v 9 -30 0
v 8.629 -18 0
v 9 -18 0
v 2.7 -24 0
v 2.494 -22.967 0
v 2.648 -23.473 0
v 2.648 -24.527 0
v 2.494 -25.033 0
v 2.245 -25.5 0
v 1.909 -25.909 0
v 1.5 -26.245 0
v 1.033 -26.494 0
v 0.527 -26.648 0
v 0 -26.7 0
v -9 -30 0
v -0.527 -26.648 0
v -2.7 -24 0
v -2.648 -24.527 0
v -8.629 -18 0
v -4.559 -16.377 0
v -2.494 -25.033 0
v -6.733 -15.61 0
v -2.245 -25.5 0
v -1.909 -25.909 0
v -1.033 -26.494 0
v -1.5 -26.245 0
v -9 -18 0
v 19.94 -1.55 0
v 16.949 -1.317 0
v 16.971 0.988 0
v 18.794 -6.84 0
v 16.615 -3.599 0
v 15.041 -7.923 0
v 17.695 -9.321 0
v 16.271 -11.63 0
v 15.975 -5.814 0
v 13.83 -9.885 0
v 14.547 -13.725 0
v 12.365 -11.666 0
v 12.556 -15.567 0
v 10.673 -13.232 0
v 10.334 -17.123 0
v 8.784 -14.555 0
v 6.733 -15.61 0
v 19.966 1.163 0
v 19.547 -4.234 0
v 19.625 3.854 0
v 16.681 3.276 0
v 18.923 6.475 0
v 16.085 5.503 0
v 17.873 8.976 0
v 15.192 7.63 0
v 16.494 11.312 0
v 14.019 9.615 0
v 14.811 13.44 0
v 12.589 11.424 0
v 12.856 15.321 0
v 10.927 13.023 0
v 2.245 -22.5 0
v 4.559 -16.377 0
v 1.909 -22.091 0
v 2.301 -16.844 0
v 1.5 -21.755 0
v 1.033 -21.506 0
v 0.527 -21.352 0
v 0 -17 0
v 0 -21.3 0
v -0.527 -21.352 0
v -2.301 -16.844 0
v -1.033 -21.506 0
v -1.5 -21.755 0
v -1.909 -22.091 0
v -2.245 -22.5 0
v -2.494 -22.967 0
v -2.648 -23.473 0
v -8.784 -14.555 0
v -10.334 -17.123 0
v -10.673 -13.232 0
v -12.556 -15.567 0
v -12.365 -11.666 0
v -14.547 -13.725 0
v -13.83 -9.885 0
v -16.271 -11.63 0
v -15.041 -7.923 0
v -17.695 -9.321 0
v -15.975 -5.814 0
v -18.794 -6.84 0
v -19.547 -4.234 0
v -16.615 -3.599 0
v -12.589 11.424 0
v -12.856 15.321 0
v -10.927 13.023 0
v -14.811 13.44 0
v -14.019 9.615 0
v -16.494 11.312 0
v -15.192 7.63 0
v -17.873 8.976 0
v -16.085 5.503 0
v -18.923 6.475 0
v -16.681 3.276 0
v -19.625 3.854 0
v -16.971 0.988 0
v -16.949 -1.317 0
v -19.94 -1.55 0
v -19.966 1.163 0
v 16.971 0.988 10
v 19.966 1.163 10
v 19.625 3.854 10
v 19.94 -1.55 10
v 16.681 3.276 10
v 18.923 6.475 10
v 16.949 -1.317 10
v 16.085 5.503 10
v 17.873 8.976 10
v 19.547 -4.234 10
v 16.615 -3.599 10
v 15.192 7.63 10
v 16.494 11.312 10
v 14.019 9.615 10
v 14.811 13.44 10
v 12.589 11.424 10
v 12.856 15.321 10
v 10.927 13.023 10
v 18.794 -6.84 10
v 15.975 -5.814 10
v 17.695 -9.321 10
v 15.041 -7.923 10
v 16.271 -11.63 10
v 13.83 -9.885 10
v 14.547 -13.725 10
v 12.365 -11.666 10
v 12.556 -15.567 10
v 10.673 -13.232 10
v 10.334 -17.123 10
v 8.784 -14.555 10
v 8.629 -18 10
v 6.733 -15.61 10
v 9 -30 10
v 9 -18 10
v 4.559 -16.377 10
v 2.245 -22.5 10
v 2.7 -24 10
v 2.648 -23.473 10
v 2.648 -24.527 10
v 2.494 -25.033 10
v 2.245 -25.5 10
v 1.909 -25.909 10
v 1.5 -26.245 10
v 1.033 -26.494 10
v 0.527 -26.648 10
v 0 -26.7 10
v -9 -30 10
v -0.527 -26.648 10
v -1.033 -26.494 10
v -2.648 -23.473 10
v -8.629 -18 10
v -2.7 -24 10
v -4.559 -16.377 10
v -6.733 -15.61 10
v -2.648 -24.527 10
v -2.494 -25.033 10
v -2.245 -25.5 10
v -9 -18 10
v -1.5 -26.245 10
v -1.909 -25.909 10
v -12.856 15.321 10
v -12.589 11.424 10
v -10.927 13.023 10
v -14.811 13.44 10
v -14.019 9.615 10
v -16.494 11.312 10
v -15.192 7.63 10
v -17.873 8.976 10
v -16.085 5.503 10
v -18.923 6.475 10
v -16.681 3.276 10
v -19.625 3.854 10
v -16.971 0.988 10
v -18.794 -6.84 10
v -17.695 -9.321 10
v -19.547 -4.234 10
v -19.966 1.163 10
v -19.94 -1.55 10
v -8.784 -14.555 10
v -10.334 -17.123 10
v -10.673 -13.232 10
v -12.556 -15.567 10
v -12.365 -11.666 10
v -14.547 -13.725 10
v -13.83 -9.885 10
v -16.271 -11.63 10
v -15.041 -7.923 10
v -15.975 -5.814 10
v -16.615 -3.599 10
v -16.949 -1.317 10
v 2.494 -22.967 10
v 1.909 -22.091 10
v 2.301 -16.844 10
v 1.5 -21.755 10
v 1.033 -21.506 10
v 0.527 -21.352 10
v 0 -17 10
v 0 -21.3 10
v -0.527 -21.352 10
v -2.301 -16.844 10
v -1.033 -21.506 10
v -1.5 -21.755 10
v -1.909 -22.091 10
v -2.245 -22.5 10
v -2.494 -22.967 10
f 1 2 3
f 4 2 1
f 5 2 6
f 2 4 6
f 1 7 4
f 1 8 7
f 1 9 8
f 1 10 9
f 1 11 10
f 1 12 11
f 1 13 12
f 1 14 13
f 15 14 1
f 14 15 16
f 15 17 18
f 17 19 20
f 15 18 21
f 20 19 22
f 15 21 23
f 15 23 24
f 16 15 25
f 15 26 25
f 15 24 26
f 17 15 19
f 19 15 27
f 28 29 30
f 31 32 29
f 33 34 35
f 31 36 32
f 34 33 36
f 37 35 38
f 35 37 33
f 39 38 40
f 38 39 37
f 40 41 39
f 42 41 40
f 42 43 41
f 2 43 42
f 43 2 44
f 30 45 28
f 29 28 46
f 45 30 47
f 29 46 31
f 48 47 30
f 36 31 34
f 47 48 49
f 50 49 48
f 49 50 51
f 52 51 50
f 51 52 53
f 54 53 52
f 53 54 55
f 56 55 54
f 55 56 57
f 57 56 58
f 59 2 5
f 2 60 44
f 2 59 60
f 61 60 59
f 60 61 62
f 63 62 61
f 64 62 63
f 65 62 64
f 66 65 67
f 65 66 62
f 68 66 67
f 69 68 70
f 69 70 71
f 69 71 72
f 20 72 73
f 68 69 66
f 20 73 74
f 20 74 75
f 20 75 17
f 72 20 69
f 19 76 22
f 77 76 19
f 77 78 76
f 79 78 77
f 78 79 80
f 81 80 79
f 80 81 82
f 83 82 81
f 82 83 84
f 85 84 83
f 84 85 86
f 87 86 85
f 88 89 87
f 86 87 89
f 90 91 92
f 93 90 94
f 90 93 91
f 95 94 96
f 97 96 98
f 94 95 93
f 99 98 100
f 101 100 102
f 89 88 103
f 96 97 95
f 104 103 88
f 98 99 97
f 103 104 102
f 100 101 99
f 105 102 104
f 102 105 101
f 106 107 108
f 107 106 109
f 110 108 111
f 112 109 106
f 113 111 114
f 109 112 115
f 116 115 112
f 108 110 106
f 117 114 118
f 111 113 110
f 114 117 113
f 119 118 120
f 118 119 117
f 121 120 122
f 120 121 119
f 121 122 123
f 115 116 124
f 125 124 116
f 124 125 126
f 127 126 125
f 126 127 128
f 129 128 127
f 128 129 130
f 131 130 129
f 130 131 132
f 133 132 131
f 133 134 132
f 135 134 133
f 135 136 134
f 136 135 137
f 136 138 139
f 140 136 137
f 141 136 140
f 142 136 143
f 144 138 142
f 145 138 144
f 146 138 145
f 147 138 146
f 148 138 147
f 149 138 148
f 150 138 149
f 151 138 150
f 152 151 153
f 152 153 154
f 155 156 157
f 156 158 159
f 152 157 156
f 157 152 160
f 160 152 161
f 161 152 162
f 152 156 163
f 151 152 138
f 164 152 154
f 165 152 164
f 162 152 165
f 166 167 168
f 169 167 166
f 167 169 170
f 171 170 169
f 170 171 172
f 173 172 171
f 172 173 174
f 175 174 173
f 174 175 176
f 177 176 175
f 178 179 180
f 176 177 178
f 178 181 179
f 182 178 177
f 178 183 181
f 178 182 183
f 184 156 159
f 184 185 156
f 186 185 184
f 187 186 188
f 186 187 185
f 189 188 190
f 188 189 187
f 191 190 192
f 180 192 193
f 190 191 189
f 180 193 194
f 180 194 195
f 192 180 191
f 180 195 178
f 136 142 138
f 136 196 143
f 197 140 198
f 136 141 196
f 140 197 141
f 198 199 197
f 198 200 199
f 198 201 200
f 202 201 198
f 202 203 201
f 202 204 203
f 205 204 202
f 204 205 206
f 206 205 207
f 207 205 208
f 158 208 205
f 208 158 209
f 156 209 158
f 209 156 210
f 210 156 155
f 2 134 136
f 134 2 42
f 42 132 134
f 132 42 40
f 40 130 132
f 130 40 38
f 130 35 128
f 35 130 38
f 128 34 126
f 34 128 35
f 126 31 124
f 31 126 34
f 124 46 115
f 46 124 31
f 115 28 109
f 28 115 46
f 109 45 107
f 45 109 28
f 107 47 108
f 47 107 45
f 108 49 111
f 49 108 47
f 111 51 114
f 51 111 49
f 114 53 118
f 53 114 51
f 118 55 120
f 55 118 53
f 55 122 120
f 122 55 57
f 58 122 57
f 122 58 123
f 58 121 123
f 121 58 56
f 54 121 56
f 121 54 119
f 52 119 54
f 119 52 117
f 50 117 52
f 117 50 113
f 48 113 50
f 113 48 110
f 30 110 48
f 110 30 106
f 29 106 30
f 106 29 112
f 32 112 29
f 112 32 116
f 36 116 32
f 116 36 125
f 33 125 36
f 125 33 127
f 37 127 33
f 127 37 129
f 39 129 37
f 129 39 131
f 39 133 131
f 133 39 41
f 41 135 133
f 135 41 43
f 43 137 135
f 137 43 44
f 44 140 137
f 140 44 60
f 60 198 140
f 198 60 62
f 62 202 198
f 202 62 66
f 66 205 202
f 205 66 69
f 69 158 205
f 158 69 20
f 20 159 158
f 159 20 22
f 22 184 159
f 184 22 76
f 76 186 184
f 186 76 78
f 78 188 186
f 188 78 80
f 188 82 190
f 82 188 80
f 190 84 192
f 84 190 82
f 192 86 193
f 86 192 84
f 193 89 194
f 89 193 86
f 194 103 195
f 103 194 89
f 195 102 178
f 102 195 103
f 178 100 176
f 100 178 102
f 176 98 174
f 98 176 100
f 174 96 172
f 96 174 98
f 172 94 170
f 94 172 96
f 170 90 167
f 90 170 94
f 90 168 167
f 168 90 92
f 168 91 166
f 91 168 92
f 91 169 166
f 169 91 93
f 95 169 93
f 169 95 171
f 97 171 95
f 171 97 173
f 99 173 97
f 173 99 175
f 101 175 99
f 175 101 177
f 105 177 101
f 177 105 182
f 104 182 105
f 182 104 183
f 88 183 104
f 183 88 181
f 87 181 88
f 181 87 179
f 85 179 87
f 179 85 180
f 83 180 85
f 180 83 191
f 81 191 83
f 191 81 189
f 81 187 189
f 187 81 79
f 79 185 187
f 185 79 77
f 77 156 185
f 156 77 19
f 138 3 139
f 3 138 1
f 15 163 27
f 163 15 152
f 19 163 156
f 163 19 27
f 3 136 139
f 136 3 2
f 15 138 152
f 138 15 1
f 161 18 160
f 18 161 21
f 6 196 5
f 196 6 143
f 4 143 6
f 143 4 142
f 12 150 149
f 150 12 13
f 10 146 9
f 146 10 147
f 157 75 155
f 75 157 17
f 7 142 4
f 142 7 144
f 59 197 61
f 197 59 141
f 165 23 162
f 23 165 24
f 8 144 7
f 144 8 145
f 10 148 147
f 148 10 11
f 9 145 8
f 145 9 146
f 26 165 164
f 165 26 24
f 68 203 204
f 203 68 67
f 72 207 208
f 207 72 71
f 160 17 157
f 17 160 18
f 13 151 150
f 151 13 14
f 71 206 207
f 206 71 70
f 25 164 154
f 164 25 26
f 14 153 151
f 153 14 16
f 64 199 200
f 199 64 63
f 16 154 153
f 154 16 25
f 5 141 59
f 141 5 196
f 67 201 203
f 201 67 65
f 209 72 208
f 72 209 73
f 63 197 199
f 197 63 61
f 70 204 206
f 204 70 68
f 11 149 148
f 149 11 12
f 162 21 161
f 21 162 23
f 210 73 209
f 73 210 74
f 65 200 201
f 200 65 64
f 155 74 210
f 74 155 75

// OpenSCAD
$fn = 32;

// ----------------------------------------------------------------------
// Spring clip: 40 mm outside, 3 mm band, 80 degree opening
// ----------------------------------------------------------------------

// --- parameters (mm) ---
outer_r = 20;             // clip outside radius
inner_r = 17;             // clip bore radius
band = 3;                 // band thickness
clip_w = 10;              // clip width
opening = 80;             // opening angle
tab_w = 18;               // tab width
tab_len = 10;             // tab length past the clip
tab_hole = 5.4;           // tab fixing hole

clip_profile = [[-12.856, 15.321], [-14.811, 13.44], [-16.494, 11.312], [-17.873, 8.976], [-18.923, 6.475], [-19.625, 3.854], [-19.966, 1.163], [-19.94, -1.55], [-19.547, -4.234], [-18.794, -6.84], [-17.695, -9.321], [-16.271, -11.63], [-14.547, -13.725], [-12.556, -15.567], [-10.334, -17.123], [-7.922, -18.364], [-5.363, -19.267], [-2.707, -19.816], [0, -20], [2.707, -19.816], [5.363, -19.267], [7.922, -18.364], [10.334, -17.123], [12.556, -15.567], [14.547, -13.725], [16.271, -11.63], [17.695, -9.321], [18.794, -6.84], [19.547, -4.234], [19.94, -1.55], [19.966, 1.163], [19.625, 3.854], [18.923, 6.475], [17.873, 8.976], [16.494, 11.312], [14.811, 13.44], [12.856, 15.321], [10.927, 13.023], [12.589, 11.424], [14.019, 9.615], [15.192, 7.63], [16.085, 5.503], [16.681, 3.276], [16.971, 0.988], [16.949, -1.317], [16.615, -3.599], [15.975, -5.814], [15.041, -7.923], [13.83, -9.885], [12.365, -11.666], [10.673, -13.232], [8.784, -14.555], [6.733, -15.61], [4.559, -16.377], [2.301, -16.844], [0, -17], [-2.301, -16.844], [-4.559, -16.377], [-6.733, -15.61], [-8.784, -14.555], [-10.673, -13.232], [-12.365, -11.666], [-13.83, -9.885], [-15.041, -7.923], [-15.975, -5.814], [-16.615, -3.599], [-16.949, -1.317], [-16.971, 0.988], [-16.681, 3.276], [-16.085, 5.503], [-15.192, 7.63], [-14.019, 9.615], [-12.589, 11.424], [-10.927, 13.023]];

difference() {
  union() {
    linear_extrude(height = clip_w) polygon(clip_profile);
    /* mounting tab, sunk 2 mm into the band */
    translate([-9, -30, 0]) cube([tab_w, 12, clip_w]);
  }
  translate([0, -24, -2.5]) cylinder(h = clip_w + 5, d = tab_hole);
}
